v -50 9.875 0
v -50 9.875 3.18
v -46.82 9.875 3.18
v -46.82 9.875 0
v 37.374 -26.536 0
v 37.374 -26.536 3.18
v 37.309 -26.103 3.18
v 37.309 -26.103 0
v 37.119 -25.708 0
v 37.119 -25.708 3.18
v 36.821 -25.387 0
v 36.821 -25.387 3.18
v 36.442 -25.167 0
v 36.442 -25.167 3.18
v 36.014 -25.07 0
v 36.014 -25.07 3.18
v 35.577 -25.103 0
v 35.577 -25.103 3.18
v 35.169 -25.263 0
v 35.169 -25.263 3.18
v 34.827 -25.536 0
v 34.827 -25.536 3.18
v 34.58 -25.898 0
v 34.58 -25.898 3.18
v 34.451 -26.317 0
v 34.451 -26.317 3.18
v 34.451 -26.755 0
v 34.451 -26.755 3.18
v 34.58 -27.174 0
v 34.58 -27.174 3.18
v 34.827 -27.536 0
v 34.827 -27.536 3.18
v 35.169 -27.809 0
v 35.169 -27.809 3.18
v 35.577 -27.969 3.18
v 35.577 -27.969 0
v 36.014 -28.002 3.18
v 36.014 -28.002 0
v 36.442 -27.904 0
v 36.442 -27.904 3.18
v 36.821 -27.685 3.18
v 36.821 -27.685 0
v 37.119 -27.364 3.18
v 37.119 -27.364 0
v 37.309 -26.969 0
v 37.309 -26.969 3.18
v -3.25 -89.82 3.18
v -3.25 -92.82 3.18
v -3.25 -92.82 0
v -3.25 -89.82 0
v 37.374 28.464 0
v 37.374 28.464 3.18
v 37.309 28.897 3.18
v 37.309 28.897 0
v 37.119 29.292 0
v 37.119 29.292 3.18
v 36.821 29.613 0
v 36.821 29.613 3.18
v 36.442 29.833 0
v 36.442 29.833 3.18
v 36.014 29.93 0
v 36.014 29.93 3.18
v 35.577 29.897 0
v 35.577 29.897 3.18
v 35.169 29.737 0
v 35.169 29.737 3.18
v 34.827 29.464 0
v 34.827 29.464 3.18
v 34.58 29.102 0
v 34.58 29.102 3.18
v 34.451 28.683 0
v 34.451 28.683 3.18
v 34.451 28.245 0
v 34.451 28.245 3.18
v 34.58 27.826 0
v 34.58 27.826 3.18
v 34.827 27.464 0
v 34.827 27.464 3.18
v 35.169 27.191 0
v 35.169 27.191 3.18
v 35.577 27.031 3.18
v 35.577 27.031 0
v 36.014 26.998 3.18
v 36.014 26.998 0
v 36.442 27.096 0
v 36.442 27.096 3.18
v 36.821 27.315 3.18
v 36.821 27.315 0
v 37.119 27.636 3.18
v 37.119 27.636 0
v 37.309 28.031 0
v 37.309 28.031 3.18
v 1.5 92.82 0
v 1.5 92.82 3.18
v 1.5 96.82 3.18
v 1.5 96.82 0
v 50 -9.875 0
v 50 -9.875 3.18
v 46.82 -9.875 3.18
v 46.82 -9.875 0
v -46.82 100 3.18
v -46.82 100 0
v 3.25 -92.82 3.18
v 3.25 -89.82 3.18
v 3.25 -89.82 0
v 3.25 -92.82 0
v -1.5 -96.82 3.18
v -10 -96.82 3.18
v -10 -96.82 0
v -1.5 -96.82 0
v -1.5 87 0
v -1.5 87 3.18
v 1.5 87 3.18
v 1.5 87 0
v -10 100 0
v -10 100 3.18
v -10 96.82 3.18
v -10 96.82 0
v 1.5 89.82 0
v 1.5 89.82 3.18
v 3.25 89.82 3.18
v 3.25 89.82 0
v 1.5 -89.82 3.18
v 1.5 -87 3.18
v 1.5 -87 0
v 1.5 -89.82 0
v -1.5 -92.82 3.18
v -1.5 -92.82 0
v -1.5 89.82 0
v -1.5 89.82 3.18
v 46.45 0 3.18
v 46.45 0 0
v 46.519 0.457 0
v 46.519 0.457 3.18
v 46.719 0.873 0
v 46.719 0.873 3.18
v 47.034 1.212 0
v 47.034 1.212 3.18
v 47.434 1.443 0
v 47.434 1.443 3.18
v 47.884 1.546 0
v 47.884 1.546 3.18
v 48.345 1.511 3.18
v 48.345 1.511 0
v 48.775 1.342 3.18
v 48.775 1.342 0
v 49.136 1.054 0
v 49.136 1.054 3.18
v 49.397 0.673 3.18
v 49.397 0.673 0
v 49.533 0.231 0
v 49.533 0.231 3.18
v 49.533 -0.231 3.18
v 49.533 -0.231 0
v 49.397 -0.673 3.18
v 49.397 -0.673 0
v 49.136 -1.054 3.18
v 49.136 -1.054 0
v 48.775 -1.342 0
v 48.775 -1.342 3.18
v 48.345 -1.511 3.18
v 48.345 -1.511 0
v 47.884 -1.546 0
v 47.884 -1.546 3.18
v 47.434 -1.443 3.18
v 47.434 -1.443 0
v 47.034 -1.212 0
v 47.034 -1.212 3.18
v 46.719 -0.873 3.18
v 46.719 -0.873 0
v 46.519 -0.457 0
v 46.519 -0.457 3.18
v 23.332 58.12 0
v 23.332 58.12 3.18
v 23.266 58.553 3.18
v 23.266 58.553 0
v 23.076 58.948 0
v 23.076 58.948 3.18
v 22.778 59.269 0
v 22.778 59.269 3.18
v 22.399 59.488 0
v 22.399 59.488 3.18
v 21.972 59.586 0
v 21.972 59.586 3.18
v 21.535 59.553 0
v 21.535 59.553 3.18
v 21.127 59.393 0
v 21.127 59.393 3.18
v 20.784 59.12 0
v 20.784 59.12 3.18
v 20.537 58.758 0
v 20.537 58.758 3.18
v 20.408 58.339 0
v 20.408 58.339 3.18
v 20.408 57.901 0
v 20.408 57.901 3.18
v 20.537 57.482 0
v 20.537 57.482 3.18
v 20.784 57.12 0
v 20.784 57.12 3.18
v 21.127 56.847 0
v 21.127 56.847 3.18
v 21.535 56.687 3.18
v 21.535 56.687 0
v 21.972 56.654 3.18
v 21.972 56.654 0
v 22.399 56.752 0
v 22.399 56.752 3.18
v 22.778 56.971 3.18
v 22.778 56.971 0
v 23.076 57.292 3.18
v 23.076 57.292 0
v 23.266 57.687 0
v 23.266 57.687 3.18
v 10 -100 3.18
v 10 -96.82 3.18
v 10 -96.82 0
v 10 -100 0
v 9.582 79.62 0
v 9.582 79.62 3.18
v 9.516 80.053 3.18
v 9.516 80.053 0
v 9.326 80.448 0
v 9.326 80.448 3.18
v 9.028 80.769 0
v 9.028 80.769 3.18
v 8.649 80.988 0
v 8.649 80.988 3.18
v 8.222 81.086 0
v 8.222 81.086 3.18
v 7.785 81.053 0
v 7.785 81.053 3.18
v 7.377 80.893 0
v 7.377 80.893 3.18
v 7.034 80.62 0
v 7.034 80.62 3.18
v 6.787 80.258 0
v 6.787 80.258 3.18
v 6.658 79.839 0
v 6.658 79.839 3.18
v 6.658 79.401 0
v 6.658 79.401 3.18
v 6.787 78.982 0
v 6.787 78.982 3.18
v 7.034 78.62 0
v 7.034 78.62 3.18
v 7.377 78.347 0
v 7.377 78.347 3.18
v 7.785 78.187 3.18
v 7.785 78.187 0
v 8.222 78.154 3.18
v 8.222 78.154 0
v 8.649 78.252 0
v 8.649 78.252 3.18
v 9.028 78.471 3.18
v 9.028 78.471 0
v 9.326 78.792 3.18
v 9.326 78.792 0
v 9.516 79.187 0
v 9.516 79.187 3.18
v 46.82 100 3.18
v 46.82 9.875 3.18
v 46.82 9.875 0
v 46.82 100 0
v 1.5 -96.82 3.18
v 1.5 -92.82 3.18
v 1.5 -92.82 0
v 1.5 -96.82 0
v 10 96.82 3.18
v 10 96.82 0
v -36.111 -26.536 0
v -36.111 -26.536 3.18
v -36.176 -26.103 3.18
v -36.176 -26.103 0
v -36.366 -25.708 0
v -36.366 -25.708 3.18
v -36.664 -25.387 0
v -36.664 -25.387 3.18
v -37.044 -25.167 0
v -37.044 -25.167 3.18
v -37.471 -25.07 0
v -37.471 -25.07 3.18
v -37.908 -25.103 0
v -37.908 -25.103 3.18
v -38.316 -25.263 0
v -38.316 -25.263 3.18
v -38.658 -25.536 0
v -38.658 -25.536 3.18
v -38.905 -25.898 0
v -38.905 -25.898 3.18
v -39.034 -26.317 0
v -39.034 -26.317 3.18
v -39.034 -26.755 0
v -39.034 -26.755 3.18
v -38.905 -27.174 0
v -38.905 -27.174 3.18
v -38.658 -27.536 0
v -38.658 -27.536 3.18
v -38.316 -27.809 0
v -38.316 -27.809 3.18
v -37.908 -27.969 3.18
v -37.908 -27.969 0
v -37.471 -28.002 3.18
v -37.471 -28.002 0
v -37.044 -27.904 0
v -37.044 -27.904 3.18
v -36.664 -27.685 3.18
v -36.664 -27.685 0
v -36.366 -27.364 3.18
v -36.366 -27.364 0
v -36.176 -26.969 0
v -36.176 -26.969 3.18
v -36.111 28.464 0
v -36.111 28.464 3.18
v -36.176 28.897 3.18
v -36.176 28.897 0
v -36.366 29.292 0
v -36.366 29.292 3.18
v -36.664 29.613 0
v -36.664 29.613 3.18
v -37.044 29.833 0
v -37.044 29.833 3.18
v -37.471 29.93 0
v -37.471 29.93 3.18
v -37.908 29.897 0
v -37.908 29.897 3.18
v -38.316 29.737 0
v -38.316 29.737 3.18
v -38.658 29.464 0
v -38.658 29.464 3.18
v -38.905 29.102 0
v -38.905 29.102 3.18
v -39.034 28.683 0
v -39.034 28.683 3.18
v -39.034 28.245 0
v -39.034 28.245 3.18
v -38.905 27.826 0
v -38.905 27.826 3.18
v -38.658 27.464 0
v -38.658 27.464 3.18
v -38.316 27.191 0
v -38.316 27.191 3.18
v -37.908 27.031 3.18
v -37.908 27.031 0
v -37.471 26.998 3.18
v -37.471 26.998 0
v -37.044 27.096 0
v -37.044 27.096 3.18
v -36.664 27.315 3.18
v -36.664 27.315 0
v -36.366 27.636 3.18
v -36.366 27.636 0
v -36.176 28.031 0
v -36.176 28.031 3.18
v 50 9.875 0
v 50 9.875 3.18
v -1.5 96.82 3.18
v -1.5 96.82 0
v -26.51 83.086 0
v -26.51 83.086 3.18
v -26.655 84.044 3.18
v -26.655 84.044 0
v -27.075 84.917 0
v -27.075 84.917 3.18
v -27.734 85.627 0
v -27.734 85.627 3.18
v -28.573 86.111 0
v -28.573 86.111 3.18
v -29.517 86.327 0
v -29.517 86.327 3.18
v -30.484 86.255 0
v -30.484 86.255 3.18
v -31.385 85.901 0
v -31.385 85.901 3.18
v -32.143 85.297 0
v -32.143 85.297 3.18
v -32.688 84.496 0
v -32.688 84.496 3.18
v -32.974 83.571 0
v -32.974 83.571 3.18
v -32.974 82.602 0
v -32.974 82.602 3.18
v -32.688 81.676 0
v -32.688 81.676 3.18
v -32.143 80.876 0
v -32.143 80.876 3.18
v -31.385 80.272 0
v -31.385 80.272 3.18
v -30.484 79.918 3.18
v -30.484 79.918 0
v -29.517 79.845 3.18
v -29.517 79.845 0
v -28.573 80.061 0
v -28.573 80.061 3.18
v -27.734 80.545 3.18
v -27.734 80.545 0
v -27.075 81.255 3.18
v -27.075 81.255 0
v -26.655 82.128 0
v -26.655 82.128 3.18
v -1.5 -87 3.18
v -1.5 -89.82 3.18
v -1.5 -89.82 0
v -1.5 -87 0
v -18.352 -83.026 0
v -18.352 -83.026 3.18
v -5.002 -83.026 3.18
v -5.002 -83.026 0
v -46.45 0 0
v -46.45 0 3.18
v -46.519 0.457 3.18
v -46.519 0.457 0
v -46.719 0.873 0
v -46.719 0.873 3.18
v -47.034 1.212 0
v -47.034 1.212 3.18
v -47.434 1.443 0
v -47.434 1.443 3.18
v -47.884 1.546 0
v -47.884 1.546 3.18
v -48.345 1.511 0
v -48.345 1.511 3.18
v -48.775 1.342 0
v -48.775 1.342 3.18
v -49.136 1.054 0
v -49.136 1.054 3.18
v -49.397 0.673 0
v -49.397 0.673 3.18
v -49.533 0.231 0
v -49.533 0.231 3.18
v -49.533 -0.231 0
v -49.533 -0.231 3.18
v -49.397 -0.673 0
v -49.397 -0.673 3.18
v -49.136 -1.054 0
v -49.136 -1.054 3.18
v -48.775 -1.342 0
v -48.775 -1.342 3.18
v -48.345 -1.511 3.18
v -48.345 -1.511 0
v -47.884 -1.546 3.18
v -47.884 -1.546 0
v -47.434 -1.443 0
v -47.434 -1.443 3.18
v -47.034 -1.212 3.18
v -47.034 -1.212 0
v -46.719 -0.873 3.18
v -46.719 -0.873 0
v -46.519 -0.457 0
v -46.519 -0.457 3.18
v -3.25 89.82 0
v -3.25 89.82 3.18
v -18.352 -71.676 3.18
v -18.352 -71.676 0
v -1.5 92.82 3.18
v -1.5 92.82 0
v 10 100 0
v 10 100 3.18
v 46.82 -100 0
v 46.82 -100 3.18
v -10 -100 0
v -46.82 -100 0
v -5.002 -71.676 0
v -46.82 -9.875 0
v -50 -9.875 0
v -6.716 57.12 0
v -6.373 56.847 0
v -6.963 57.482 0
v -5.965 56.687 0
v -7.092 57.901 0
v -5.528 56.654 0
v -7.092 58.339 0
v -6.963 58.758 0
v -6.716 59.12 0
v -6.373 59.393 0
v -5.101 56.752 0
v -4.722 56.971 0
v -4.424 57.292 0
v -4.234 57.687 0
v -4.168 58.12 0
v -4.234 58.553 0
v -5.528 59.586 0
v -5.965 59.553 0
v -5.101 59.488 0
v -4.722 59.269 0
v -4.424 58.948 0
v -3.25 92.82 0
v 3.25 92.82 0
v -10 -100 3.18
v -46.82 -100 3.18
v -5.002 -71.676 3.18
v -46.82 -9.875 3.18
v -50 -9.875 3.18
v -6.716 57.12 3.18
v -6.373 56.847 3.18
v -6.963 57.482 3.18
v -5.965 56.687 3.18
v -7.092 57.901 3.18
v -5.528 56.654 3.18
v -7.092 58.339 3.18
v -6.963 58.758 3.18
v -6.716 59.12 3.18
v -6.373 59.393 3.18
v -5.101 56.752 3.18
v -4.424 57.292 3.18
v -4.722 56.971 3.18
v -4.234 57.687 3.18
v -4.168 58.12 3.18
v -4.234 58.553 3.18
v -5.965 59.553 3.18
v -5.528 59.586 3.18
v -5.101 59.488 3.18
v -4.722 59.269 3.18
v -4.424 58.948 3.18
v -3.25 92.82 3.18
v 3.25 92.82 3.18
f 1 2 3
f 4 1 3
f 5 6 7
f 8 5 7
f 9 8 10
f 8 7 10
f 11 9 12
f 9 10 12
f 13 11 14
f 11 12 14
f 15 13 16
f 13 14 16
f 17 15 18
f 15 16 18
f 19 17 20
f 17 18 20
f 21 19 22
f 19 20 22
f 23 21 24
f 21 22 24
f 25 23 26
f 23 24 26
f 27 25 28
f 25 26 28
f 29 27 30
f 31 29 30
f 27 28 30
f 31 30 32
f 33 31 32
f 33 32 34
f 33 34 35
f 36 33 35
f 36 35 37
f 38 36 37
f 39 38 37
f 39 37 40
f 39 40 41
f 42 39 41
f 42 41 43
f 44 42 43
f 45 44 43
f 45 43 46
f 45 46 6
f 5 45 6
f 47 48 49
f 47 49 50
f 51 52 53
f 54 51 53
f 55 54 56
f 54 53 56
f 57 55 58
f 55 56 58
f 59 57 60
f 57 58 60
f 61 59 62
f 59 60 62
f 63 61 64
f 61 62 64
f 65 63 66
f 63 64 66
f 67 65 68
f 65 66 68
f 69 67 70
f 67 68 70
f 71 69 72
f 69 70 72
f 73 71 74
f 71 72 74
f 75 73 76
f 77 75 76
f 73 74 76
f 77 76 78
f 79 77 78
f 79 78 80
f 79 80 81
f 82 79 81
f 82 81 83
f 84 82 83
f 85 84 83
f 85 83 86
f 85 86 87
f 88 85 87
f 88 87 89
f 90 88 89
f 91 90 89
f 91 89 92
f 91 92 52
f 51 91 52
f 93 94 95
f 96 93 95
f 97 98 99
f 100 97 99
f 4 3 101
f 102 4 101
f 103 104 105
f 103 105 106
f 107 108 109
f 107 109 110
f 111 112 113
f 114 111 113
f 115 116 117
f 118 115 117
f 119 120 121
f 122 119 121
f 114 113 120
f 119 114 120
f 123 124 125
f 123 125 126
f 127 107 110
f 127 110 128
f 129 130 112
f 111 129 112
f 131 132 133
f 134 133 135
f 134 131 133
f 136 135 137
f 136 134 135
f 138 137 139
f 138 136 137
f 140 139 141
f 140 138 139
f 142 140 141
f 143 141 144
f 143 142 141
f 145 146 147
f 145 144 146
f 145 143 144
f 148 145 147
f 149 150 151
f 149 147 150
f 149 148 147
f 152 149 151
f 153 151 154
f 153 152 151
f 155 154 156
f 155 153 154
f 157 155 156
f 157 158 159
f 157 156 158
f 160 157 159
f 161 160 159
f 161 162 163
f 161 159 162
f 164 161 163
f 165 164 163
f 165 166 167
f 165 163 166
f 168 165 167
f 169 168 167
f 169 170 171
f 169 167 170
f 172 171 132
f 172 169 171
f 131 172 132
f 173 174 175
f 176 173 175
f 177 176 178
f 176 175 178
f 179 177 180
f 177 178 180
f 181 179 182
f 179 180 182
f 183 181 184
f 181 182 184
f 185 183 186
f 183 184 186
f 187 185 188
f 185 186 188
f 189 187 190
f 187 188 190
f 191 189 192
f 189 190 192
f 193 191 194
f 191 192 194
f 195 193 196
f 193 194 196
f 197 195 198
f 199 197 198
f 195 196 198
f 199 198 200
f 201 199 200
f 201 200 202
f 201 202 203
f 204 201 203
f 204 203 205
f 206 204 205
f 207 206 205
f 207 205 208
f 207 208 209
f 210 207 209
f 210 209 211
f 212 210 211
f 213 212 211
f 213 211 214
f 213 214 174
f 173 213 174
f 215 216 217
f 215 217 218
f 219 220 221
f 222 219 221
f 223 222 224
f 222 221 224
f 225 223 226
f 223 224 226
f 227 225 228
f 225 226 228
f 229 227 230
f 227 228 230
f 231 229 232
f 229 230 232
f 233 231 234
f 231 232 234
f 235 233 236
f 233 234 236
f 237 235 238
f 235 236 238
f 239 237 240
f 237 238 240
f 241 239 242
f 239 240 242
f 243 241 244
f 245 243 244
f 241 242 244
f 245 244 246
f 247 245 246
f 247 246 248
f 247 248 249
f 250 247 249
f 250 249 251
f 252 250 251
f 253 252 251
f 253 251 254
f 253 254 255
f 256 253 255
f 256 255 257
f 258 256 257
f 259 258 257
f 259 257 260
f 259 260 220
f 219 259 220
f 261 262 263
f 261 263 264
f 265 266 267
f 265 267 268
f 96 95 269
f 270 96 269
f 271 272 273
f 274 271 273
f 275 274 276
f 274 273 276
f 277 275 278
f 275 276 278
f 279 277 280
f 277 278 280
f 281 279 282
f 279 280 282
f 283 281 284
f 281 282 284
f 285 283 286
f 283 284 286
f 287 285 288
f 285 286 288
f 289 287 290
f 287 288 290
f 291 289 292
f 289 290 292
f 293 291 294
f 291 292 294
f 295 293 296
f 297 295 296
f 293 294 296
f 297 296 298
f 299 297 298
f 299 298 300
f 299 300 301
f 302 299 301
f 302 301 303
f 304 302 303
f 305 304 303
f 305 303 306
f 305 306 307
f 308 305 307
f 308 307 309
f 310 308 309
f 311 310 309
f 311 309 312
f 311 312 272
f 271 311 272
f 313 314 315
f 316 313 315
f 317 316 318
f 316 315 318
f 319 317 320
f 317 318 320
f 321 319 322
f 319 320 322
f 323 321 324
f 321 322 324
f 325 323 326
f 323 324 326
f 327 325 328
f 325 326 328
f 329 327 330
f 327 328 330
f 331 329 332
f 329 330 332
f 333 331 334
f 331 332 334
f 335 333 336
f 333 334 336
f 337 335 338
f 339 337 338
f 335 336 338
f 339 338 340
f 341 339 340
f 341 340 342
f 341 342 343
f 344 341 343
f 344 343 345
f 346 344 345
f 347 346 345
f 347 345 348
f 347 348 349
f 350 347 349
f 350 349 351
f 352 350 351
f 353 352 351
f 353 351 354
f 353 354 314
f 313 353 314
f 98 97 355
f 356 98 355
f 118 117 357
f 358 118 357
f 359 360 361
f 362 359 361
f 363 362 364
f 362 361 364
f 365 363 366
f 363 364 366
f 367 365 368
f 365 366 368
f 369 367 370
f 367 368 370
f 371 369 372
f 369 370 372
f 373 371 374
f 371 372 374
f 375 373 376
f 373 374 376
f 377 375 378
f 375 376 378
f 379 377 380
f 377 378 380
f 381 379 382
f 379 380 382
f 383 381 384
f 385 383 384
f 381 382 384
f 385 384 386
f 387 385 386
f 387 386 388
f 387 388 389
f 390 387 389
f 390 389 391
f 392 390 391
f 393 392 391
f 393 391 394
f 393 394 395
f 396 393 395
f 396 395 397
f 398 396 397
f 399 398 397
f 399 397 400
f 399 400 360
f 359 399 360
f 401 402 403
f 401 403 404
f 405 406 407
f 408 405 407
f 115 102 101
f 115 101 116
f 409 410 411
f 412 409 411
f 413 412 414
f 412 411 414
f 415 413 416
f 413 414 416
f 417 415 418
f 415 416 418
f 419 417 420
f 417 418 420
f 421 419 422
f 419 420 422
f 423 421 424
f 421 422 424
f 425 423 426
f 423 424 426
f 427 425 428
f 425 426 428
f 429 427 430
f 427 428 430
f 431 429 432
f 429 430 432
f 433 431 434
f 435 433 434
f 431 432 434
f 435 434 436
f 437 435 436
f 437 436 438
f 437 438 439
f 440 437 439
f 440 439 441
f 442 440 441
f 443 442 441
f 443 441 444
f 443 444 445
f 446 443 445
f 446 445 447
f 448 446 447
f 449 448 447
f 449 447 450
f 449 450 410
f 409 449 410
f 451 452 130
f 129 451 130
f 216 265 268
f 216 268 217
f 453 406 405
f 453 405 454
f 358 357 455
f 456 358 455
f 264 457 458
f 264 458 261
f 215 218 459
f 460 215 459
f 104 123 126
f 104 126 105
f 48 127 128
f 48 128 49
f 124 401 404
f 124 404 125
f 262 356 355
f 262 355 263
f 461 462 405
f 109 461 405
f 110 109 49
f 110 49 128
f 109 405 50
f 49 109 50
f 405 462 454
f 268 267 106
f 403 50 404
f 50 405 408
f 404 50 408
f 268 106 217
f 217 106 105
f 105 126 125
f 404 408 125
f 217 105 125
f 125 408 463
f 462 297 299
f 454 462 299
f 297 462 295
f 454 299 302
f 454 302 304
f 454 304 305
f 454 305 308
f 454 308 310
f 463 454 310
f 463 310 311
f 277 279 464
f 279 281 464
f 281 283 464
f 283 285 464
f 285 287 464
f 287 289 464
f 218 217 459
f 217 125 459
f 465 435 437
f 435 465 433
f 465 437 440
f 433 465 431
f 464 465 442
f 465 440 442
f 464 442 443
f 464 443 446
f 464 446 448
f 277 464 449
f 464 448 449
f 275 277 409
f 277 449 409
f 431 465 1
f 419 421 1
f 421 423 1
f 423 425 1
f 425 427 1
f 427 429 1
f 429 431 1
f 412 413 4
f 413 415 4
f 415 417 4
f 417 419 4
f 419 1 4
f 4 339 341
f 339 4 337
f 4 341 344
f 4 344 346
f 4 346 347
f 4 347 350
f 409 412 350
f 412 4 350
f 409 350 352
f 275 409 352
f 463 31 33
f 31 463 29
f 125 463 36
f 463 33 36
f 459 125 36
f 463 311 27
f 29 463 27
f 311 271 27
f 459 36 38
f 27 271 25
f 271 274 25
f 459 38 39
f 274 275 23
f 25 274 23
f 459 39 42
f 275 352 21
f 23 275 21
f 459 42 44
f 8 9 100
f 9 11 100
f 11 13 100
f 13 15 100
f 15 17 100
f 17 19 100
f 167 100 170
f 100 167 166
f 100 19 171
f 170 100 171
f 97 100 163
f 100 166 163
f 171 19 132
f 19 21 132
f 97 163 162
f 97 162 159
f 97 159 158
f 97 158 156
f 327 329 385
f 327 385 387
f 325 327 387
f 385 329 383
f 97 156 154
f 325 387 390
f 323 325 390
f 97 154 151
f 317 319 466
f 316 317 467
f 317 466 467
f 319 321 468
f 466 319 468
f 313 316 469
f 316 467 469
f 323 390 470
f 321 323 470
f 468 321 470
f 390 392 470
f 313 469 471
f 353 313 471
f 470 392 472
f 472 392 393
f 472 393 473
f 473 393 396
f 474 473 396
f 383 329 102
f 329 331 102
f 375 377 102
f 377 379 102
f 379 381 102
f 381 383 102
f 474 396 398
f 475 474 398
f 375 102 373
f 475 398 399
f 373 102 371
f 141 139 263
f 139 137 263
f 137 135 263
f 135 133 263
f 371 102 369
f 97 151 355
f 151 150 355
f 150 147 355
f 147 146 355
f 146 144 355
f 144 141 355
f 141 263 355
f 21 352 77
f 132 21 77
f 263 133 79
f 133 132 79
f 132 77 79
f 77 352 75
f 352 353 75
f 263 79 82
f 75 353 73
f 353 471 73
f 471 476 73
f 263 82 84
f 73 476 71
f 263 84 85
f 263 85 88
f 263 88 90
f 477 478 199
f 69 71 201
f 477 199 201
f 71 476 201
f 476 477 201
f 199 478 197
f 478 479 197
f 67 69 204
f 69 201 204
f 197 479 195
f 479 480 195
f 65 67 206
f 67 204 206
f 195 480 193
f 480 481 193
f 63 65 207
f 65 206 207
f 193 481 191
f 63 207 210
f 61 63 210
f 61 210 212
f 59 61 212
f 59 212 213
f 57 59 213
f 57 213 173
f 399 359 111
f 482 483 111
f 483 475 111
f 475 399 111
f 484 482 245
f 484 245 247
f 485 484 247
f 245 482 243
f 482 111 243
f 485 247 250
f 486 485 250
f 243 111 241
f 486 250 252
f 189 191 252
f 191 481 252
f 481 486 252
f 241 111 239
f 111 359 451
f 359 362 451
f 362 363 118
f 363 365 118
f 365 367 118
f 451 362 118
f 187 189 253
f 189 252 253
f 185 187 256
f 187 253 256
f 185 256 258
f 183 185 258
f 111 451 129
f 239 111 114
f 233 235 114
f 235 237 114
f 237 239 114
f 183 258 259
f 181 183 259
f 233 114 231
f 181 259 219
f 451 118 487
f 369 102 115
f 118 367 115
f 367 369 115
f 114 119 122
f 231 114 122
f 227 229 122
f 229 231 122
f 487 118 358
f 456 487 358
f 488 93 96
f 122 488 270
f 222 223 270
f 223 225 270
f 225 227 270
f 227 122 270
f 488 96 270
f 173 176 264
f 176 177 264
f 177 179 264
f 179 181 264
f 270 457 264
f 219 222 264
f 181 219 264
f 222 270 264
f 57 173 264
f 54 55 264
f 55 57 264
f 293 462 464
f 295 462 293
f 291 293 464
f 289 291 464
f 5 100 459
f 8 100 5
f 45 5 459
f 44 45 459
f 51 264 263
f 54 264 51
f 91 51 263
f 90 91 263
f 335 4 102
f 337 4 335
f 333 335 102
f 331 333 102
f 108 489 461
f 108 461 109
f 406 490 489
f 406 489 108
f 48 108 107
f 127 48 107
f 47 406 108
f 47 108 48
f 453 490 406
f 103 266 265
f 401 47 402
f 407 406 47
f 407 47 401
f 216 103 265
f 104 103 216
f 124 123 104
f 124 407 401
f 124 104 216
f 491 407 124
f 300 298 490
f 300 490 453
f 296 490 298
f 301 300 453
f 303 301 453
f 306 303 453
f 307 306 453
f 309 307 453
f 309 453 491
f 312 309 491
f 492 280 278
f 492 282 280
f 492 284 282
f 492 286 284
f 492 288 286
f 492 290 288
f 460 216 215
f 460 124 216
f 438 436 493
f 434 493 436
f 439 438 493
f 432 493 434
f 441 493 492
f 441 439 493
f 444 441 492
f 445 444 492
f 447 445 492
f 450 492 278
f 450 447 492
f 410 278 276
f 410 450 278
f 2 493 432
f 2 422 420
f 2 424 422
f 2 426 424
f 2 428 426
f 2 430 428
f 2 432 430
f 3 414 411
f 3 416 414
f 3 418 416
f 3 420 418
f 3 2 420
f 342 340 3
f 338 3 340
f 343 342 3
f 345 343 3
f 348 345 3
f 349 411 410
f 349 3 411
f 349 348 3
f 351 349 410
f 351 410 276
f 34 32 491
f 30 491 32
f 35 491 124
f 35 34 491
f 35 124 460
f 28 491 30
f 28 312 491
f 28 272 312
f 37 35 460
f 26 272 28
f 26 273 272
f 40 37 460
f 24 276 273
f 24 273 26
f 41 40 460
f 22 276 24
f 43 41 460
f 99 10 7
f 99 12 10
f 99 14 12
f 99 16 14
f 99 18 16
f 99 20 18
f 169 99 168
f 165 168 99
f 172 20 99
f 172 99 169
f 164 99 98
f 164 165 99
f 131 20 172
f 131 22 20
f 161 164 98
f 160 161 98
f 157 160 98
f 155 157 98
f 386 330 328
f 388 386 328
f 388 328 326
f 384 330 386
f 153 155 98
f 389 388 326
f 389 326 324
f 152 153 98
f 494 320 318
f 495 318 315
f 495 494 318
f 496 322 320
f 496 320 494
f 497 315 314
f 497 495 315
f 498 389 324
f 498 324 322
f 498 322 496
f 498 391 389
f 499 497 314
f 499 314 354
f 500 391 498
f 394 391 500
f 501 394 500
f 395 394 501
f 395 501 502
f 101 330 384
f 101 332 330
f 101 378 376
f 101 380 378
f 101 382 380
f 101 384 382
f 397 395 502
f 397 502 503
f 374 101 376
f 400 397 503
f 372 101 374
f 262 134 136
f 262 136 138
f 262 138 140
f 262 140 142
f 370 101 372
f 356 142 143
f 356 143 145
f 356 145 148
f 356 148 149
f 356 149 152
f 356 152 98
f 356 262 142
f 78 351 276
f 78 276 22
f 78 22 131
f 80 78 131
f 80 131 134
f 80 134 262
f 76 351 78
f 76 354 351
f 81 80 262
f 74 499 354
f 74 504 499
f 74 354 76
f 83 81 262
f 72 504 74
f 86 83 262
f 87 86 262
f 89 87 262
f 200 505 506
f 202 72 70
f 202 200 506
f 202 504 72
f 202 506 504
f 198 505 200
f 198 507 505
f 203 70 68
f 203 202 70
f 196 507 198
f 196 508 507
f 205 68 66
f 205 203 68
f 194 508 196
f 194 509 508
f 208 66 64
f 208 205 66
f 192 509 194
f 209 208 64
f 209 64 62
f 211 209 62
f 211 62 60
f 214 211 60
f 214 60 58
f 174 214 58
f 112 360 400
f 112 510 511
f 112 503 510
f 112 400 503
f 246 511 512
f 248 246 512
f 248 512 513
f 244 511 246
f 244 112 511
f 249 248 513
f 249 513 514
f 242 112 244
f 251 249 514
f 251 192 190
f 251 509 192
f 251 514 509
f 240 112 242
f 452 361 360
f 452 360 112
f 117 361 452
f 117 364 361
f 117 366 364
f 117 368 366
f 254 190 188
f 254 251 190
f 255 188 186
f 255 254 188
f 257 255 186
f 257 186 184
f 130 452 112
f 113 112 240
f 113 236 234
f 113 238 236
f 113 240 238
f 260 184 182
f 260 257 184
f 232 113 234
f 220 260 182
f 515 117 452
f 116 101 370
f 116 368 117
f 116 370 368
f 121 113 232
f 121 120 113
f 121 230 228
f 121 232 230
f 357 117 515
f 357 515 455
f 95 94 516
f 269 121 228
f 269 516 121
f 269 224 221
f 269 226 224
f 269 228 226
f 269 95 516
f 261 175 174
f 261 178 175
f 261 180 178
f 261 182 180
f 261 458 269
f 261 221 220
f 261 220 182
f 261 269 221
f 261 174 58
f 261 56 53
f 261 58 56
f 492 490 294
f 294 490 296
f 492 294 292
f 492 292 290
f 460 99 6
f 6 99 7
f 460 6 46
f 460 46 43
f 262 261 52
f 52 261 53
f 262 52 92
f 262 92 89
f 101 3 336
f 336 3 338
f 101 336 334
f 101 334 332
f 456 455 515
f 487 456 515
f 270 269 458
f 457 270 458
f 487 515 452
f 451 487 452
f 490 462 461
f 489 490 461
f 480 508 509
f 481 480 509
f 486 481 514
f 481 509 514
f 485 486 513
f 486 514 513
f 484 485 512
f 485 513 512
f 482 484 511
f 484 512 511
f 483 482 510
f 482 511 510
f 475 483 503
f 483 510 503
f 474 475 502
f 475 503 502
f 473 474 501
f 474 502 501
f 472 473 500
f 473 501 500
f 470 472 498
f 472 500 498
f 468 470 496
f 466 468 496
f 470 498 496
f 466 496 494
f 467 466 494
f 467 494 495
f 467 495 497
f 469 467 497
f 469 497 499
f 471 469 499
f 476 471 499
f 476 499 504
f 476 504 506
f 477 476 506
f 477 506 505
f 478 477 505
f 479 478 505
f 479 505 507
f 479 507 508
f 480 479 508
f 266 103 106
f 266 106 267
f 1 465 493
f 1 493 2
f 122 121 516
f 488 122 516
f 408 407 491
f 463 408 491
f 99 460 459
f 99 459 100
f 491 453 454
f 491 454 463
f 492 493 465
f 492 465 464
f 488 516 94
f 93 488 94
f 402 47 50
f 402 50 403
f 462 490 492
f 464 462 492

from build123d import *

# Parameters (mm, degrees)
SKETCH1_W           = 100
SKETCH1_H           = 200
BOSS_EXTRUDE2_DEPTH = 3.18
SKETCH2_R           = 1.55
SKETCH2_W           = 3.18
SKETCH2_H           = 90.125
CUT_EXTRUDE1_DEPTH  = 4.18
SKETCH5_R           = 1.47
CUT_EXTRUDE4_DEPTH  = 4.18
SKETCH6_R           = 1.47
CUT_EXTRUDE5_DEPTH  = 4.18
SKETCH4_W           = 13.35
SKETCH4_H           = 11.35
CUT_EXTRUDE7_DEPTH  = 4.18
SKETCH7_R           = 3.25
CUT_EXTRUDE8_DEPTH  = 4.18


with BuildPart() as part:
    # Sketch1 → Boss-Extrude2 (new body)
    with BuildSketch(Plane.XY):
        Rectangle(SKETCH1_W, SKETCH1_H)
    extrude(amount=BOSS_EXTRUDE2_DEPTH)

    # Sketch2 → Cut-Extrude1 (cut, through all)
    with BuildSketch(Plane.XY.offset(3.18)):
        with Locations((-48, 0)):
            Circle(SKETCH2_R)
        Polygon((-10, 100), (-10, 96.82), (-1.5, 96.82), (-1.5, 92.82), (-3.25, 92.82), (-3.25, 89.82), (-1.5, 89.82), (-1.5, 87), (1.5, 87), (1.5, 89.82), (3.25, 89.82), (3.25, 92.82), (1.5, 92.82), (1.5, 96.82), (10, 96.82), (10, 100), align=None)
        with Locations((-48.41, 54.9375)):
            Rectangle(SKETCH2_W, SKETCH2_H)
        with Locations((-48.41, -54.9375)):
            Rectangle(SKETCH2_W, SKETCH2_H)
    cut_extrude1 = extrude(amount=-CUT_EXTRUDE1_DEPTH, mode=Mode.SUBTRACT)

    # Mirror1: Cut-Extrude1 across plane
    add(cut_extrude1.mirror(Plane.ZX), mode=Mode.SUBTRACT)

    # Mirror3: Cut-Extrude1 across plane
    add(cut_extrude1.mirror(Plane(origin=(0, 0, 0), x_dir=(0, 0, 1), z_dir=(1, 0, 0))), mode=Mode.SUBTRACT)

    # Sketch5 → Cut-Extrude4 (cut, through all)
    with BuildSketch(Plane.XY.offset(3.18)):
        with Locations((-37.58090562, 28.464149283)):
            Circle(SKETCH5_R)
        with Locations((35.904481485, 28.464149283)):
            Circle(SKETCH5_R)
        with Locations((-37.58090562, -26.535850717)):
            Circle(SKETCH5_R)
        with Locations((35.904481485, -26.535850717)):
            Circle(SKETCH5_R)
    extrude(amount=-CUT_EXTRUDE4_DEPTH, mode=Mode.SUBTRACT)

    # Sketch6 → Cut-Extrude5 (cut, through all)
    with BuildSketch(Plane.XY.offset(3.18)):
        with Locations((-5.638260743, 58.12)):
            Circle(SKETCH6_R)
        with Locations((8.111739257, 79.62)):
            Circle(SKETCH6_R)
        with Locations((21.861739257, 58.12)):
            Circle(SKETCH6_R)
    extrude(amount=-CUT_EXTRUDE5_DEPTH, mode=Mode.SUBTRACT)

    # Sketch4 → Cut-Extrude7 (cut, through all)
    with BuildSketch(Plane.XY.offset(3.18)):
        with Locations((-11.677157219, -77.351093612)):
            Rectangle(SKETCH4_W, SKETCH4_H)
    extrude(amount=-CUT_EXTRUDE7_DEPTH, mode=Mode.SUBTRACT)

    # Sketch7 → Cut-Extrude8 (cut, through all)
    with BuildSketch(Plane.XY.offset(3.18)):
        with Locations((-29.760307604, 83.086151576)):
            Circle(SKETCH7_R)
    extrude(amount=-CUT_EXTRUDE8_DEPTH, mode=Mode.SUBTRACT)


solid = part.part
